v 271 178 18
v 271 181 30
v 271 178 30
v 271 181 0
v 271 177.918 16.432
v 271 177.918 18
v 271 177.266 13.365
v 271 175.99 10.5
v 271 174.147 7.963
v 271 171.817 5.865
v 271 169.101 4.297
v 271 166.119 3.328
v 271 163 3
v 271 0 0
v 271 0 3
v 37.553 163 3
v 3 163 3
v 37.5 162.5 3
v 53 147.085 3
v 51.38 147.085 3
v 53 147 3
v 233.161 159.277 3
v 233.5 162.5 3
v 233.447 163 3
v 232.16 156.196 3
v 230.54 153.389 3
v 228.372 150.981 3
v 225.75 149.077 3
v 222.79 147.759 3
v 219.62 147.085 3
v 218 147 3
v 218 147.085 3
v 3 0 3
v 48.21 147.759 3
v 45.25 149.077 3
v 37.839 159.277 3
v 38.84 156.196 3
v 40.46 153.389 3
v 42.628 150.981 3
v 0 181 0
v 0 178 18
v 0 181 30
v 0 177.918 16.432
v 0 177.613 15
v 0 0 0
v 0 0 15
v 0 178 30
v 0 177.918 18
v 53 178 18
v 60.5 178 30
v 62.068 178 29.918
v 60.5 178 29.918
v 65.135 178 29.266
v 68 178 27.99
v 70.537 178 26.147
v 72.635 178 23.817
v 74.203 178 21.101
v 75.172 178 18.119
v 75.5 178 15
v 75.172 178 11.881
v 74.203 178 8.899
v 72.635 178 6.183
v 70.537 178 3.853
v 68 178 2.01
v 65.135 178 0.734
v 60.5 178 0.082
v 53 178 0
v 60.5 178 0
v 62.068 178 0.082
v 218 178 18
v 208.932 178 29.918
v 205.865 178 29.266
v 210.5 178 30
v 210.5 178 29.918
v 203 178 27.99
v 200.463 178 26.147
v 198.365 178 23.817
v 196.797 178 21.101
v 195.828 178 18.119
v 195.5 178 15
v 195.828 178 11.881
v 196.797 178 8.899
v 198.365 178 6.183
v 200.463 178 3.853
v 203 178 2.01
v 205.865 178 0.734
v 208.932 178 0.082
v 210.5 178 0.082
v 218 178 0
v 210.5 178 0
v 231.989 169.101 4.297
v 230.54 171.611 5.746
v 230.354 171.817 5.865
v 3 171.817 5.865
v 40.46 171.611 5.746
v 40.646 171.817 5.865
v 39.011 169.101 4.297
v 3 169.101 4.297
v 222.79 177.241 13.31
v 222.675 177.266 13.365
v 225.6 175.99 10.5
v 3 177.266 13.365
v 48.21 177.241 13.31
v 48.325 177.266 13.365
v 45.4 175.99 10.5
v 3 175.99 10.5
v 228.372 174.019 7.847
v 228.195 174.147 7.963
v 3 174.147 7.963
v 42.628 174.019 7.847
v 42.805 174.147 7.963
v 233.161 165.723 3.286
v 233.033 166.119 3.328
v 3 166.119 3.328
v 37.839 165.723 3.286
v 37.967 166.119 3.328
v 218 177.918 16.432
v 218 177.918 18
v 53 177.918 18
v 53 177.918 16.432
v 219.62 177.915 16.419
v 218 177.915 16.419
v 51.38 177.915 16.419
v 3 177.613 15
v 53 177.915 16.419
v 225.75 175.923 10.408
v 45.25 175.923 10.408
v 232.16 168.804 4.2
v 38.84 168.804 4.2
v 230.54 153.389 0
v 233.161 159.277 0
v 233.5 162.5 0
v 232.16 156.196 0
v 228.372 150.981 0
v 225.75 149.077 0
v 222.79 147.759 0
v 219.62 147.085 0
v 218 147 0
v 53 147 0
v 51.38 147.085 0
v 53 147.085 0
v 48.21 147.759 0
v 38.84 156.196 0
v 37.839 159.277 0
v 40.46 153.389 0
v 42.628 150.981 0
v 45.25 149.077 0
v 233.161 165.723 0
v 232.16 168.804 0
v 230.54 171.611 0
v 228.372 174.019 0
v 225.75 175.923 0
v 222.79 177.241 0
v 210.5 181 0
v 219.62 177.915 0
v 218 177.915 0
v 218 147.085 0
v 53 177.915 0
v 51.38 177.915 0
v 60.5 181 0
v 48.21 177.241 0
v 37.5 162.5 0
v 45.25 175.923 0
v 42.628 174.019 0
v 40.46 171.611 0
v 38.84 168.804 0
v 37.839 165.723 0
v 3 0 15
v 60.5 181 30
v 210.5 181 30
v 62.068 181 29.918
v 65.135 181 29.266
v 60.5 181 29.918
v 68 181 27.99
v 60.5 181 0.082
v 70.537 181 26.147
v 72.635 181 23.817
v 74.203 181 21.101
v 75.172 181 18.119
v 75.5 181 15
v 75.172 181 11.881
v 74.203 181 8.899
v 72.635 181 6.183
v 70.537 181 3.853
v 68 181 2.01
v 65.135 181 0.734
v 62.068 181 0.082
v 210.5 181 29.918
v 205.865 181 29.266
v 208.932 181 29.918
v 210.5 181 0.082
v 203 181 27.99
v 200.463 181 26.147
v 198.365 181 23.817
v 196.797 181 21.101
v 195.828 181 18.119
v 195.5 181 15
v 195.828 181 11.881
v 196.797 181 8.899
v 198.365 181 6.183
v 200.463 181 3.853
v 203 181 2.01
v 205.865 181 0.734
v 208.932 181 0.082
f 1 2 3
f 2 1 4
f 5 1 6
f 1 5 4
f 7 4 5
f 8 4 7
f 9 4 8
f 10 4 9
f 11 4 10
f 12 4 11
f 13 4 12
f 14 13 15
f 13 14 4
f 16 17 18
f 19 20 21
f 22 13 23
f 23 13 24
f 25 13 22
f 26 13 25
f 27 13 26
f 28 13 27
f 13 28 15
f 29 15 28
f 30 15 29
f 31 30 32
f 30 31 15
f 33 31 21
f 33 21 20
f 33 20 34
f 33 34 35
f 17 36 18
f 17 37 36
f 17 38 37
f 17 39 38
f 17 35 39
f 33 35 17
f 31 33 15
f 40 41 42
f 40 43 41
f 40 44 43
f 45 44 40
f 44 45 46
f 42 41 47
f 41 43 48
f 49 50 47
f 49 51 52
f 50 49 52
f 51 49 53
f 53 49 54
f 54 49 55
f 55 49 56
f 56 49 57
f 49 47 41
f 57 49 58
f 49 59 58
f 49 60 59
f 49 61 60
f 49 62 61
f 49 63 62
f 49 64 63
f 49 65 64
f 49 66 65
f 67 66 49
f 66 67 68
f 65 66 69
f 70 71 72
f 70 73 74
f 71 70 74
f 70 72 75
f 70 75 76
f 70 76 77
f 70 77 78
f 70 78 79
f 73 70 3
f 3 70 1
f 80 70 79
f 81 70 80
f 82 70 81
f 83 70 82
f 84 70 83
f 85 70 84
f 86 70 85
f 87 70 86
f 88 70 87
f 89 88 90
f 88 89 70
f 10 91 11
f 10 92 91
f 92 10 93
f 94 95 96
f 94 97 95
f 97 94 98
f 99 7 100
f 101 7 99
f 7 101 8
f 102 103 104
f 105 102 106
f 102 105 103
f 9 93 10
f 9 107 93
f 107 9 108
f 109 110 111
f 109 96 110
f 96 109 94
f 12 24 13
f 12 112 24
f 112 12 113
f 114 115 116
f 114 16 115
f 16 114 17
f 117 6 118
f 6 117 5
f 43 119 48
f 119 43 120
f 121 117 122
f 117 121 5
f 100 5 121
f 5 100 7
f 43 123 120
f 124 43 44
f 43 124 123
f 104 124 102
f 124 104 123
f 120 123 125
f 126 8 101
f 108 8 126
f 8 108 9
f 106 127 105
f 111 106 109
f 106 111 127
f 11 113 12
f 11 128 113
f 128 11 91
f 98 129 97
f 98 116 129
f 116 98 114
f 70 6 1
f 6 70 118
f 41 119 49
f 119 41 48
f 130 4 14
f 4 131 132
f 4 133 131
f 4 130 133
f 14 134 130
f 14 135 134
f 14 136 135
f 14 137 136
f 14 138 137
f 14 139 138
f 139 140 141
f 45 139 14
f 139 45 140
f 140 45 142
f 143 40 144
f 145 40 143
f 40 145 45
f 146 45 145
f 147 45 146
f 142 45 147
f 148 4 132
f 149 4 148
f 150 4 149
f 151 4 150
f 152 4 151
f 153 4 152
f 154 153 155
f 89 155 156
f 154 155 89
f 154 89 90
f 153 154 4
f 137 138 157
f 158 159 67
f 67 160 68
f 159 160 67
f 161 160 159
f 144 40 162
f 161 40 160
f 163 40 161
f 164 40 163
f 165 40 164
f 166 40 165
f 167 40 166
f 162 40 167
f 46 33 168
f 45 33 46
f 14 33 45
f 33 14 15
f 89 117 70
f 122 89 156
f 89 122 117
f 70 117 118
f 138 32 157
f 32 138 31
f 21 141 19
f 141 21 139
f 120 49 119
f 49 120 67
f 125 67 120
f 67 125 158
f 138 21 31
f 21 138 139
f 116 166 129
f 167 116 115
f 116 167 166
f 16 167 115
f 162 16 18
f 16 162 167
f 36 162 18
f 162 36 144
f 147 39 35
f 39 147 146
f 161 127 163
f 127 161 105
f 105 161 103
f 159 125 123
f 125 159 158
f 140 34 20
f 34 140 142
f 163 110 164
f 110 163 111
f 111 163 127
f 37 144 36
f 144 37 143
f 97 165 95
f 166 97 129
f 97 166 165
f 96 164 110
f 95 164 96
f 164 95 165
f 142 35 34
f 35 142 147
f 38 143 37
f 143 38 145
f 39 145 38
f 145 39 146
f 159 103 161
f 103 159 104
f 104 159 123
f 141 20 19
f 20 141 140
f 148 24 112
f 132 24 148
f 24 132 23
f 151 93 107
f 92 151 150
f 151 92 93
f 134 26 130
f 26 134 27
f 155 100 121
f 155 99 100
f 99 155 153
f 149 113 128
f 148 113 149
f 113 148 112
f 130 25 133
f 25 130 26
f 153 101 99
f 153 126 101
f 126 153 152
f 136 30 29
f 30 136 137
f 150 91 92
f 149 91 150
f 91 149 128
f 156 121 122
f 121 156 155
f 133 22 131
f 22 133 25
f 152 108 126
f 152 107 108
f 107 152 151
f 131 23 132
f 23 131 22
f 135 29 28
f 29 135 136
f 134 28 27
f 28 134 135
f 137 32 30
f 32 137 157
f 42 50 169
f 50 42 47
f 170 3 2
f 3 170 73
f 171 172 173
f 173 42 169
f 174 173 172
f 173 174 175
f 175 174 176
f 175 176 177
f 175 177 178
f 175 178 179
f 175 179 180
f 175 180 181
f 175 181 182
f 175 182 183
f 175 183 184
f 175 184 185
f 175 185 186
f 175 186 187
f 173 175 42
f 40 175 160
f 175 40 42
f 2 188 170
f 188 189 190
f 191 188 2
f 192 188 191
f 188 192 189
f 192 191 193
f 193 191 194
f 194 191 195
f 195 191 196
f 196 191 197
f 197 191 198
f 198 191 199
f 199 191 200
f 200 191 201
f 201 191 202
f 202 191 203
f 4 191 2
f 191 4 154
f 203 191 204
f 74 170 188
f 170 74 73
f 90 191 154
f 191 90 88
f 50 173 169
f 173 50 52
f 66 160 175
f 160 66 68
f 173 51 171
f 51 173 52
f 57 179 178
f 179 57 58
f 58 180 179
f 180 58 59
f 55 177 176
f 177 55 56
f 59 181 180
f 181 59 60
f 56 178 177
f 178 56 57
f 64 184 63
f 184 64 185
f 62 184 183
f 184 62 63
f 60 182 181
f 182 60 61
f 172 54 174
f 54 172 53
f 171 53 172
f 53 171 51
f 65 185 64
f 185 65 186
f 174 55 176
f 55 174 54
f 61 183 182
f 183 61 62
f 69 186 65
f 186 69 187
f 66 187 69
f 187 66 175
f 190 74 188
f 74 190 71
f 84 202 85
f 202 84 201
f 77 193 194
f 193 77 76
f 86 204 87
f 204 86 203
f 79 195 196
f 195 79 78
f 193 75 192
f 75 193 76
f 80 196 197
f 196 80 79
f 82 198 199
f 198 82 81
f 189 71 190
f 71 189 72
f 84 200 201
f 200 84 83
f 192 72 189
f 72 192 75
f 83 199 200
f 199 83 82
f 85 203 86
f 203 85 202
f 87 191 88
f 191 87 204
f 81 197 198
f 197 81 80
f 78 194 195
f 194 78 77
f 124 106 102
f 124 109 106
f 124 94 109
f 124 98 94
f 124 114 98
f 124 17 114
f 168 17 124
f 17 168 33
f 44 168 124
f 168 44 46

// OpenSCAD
shelf_width = 271;
shelf_depth = 178;
shelf_height = 3;

rear_cutout_width = 165;
rear_cutout_depth = 31;

backrest_depth = 3;
backrest_height = 30;
    
backrest_center_clearance = 120;

left_lip_height = 12;
left_lip_width = 3;

back_brace_diameter = 30;

module shelf() {
    cube([shelf_width, shelf_depth, shelf_height]);
    
    back_brace();
}

module back_brace() {
    translate([0, shelf_depth - back_brace_diameter,shelf_height])
    difference() {
        cube([shelf_width, back_brace_diameter, back_brace_diameter]);
        
        translate([0, back_brace_diameter / 2, back_brace_diameter / 2])
            rotate([0, 90, 0])
                cylinder(h = shelf_width, d = back_brace_diameter);

        translate([0, -back_brace_diameter / 2, 0])
            cube([shelf_width, back_brace_diameter, back_brace_diameter]);
        
        translate([0, 0, back_brace_diameter / 2])
            cube([shelf_width, back_brace_diameter, back_brace_diameter]);
    };
}

module rear_cutout() {
    translate([(shelf_width-rear_cutout_width)/2, shelf_depth - rear_cutout_depth, 0])
        cube([rear_cutout_width, rear_cutout_depth, shelf_height + back_brace_diameter]);
    
    translate([(shelf_width - rear_cutout_width) / 2, shelf_depth - rear_cutout_depth + (rear_cutout_depth / 2), 0])
        cylinder(h = shelf_height + back_brace_diameter, d = rear_cutout_depth);
    
    translate([(shelf_width + rear_cutout_width) / 2, shelf_depth - rear_cutout_depth + (rear_cutout_depth / 2), 0])
        cylinder(h = shelf_height + back_brace_diameter, d = rear_cutout_depth);
}

module backrest() {
    translate([0, shelf_depth, 0])
        difference() {
            cube([shelf_width, backrest_depth, backrest_height]);
            
            translate([(shelf_width - backrest_center_clearance - backrest_height) / 2, 0, 0])
                cube([backrest_center_clearance + backrest_height, backrest_depth, backrest_height]);
        }
                
    translate([(shelf_width - backrest_center_clearance) / 2 - backrest_height /2, shelf_depth + backrest_depth, backrest_height / 2])
        rotate([90, 0, 0])
            cylinder(h = backrest_depth, d = backrest_height);
        
    translate([(shelf_width + backrest_center_clearance) / 2 + backrest_height / 2, shelf_depth + backrest_depth, backrest_height / 2])
        rotate([90, 0, 0])
            cylinder(h = backrest_depth, d = backrest_height);
}

module left_lip() {
    cube([left_lip_width, shelf_depth, shelf_height + left_lip_height]);
}


module build_shelf() {
    difference() {
        shelf();
        rear_cutout();
    }
    backrest();
    left_lip();
}

palette_width = shelf_width - left_lip_width;
palette_depth = shelf_depth - rear_cutout_depth;
palette_thickness = 1;
palette_shelf_depth = 16;
palette_shelf_thickness = 1;
palette_wire_hole_spacing = 8;
palette_wire_hole_diameter = 2;

num_palette_shelves = 4;

module palette_base() {
    cube([palette_width, palette_depth, palette_thickness]);
}
module palette_border() {
    translate([0, 0, palette_thickness])
        difference() {
            cube([palette_width, palette_depth, palette_shelf_depth]);
            
            translate([palette_shelf_thickness, palette_shelf_thickness, 0])
                cube([palette_width - 2 * palette_shelf_thickness, palette_depth - 2 * palette_shelf_thickness, palette_shelf_depth]);
        }
}

module vertical_reinforcement(length, radius, spacing) {
    module single_reinforcement() {
        difference() {
            cube([length, radius, radius]);
            
            translate([0, 0, radius])
            rotate([0, 90 ,0])
                cylinder(h = length, r = radius);
        }
    }
    
    translate([0, -radius, 0]) {
        single_reinforcement();
        // .001 gets rid of warning; ditch that when openscad fixed
        translate([length, 2 * radius + spacing - .001, 0])
            rotate([0, 0, 180])
                single_reinforcement();
    }
}

module palette_shelves() {
    shelf_every = palette_depth / (num_palette_shelves + 1);
    for (shelf_index = [1:1:num_palette_shelves]) {
        translate([0, shelf_index * shelf_every, palette_thickness]) {
            cube([palette_width, palette_shelf_thickness, palette_shelf_depth]);
            
            vertical_reinforcement(palette_width, 2, palette_shelf_thickness);
        }
    }
}

module palette_wire_holes() {
    offset = (palette_width - rear_cutout_width) / 2;
    hole_cutout_offsets = [offset, offset + palette_wire_hole_spacing, palette_width - offset, palette_width - offset - palette_wire_hole_spacing];
    for(this_offset = hole_cutout_offsets) {
        translate([this_offset, 2 * palette_shelf_thickness, palette_thickness + palette_wire_hole_diameter / 2])
            rotate([90, 0, 0])
                cylinder(h = palette_shelf_thickness * 4, d = palette_wire_hole_diameter);
    }
}

module build_palette() {
    palette_base();
    difference() {
        palette_border();
        palette_wire_holes();
    };
    palette_shelves();
}

// Build one at a time:
build_shelf();
//build_palette();


// More information: https://danielupshaw.com/openscad-rounded-corners/

// Set to 0.01 for higher definition curves (renders slower)
$fs = 0.10;

module roundedcube(size = [1, 1, 1], center = false, radius = 0.5, apply_to = "all") {
	// If single value, convert to [x, y, z] vector
	size = (size[0] == undef) ? [size, size, size] : size;

	translate_min = radius;
	translate_xmax = size[0] - radius;
	translate_ymax = size[1] - radius;
	translate_zmax = size[2] - radius;

	diameter = radius * 2;

	obj_translate = (center == false) ?
		[0, 0, 0] : [
			-(size[0] / 2),
			-(size[1] / 2),
			-(size[2] / 2)
		];

	translate(v = obj_translate) {
		hull() {
			for (translate_x = [translate_min, translate_xmax]) {
				x_at = (translate_x == translate_min) ? "min" : "max";
				for (translate_y = [translate_min, translate_ymax]) {
					y_at = (translate_y == translate_min) ? "min" : "max";
					for (translate_z = [translate_min, translate_zmax]) {
						z_at = (translate_z == translate_min) ? "min" : "max";

						translate(v = [translate_x, translate_y, translate_z])
						if (
							(apply_to == "all") ||
							(apply_to == "xmin" && x_at == "min") || (apply_to == "xmax" && x_at == "max") ||
							(apply_to == "ymin" && y_at == "min") || (apply_to == "ymax" && y_at == "max") ||
							(apply_to == "zmin" && z_at == "min") || (apply_to == "zmax" && z_at == "max")
						) {
							sphere(r = radius);
						} else {
							rotate = 
								(apply_to == "xmin" || apply_to == "xmax" || apply_to == "x") ? [0, 90, 0] : (
								(apply_to == "ymin" || apply_to == "ymax" || apply_to == "y") ? [90, 90, 0] :
								[0, 0, 0]
							);
							rotate(a = rotate)
							cylinder(h = diameter, r = radius, center = true);
						}
					}
				}
			}
		}
	}
}
